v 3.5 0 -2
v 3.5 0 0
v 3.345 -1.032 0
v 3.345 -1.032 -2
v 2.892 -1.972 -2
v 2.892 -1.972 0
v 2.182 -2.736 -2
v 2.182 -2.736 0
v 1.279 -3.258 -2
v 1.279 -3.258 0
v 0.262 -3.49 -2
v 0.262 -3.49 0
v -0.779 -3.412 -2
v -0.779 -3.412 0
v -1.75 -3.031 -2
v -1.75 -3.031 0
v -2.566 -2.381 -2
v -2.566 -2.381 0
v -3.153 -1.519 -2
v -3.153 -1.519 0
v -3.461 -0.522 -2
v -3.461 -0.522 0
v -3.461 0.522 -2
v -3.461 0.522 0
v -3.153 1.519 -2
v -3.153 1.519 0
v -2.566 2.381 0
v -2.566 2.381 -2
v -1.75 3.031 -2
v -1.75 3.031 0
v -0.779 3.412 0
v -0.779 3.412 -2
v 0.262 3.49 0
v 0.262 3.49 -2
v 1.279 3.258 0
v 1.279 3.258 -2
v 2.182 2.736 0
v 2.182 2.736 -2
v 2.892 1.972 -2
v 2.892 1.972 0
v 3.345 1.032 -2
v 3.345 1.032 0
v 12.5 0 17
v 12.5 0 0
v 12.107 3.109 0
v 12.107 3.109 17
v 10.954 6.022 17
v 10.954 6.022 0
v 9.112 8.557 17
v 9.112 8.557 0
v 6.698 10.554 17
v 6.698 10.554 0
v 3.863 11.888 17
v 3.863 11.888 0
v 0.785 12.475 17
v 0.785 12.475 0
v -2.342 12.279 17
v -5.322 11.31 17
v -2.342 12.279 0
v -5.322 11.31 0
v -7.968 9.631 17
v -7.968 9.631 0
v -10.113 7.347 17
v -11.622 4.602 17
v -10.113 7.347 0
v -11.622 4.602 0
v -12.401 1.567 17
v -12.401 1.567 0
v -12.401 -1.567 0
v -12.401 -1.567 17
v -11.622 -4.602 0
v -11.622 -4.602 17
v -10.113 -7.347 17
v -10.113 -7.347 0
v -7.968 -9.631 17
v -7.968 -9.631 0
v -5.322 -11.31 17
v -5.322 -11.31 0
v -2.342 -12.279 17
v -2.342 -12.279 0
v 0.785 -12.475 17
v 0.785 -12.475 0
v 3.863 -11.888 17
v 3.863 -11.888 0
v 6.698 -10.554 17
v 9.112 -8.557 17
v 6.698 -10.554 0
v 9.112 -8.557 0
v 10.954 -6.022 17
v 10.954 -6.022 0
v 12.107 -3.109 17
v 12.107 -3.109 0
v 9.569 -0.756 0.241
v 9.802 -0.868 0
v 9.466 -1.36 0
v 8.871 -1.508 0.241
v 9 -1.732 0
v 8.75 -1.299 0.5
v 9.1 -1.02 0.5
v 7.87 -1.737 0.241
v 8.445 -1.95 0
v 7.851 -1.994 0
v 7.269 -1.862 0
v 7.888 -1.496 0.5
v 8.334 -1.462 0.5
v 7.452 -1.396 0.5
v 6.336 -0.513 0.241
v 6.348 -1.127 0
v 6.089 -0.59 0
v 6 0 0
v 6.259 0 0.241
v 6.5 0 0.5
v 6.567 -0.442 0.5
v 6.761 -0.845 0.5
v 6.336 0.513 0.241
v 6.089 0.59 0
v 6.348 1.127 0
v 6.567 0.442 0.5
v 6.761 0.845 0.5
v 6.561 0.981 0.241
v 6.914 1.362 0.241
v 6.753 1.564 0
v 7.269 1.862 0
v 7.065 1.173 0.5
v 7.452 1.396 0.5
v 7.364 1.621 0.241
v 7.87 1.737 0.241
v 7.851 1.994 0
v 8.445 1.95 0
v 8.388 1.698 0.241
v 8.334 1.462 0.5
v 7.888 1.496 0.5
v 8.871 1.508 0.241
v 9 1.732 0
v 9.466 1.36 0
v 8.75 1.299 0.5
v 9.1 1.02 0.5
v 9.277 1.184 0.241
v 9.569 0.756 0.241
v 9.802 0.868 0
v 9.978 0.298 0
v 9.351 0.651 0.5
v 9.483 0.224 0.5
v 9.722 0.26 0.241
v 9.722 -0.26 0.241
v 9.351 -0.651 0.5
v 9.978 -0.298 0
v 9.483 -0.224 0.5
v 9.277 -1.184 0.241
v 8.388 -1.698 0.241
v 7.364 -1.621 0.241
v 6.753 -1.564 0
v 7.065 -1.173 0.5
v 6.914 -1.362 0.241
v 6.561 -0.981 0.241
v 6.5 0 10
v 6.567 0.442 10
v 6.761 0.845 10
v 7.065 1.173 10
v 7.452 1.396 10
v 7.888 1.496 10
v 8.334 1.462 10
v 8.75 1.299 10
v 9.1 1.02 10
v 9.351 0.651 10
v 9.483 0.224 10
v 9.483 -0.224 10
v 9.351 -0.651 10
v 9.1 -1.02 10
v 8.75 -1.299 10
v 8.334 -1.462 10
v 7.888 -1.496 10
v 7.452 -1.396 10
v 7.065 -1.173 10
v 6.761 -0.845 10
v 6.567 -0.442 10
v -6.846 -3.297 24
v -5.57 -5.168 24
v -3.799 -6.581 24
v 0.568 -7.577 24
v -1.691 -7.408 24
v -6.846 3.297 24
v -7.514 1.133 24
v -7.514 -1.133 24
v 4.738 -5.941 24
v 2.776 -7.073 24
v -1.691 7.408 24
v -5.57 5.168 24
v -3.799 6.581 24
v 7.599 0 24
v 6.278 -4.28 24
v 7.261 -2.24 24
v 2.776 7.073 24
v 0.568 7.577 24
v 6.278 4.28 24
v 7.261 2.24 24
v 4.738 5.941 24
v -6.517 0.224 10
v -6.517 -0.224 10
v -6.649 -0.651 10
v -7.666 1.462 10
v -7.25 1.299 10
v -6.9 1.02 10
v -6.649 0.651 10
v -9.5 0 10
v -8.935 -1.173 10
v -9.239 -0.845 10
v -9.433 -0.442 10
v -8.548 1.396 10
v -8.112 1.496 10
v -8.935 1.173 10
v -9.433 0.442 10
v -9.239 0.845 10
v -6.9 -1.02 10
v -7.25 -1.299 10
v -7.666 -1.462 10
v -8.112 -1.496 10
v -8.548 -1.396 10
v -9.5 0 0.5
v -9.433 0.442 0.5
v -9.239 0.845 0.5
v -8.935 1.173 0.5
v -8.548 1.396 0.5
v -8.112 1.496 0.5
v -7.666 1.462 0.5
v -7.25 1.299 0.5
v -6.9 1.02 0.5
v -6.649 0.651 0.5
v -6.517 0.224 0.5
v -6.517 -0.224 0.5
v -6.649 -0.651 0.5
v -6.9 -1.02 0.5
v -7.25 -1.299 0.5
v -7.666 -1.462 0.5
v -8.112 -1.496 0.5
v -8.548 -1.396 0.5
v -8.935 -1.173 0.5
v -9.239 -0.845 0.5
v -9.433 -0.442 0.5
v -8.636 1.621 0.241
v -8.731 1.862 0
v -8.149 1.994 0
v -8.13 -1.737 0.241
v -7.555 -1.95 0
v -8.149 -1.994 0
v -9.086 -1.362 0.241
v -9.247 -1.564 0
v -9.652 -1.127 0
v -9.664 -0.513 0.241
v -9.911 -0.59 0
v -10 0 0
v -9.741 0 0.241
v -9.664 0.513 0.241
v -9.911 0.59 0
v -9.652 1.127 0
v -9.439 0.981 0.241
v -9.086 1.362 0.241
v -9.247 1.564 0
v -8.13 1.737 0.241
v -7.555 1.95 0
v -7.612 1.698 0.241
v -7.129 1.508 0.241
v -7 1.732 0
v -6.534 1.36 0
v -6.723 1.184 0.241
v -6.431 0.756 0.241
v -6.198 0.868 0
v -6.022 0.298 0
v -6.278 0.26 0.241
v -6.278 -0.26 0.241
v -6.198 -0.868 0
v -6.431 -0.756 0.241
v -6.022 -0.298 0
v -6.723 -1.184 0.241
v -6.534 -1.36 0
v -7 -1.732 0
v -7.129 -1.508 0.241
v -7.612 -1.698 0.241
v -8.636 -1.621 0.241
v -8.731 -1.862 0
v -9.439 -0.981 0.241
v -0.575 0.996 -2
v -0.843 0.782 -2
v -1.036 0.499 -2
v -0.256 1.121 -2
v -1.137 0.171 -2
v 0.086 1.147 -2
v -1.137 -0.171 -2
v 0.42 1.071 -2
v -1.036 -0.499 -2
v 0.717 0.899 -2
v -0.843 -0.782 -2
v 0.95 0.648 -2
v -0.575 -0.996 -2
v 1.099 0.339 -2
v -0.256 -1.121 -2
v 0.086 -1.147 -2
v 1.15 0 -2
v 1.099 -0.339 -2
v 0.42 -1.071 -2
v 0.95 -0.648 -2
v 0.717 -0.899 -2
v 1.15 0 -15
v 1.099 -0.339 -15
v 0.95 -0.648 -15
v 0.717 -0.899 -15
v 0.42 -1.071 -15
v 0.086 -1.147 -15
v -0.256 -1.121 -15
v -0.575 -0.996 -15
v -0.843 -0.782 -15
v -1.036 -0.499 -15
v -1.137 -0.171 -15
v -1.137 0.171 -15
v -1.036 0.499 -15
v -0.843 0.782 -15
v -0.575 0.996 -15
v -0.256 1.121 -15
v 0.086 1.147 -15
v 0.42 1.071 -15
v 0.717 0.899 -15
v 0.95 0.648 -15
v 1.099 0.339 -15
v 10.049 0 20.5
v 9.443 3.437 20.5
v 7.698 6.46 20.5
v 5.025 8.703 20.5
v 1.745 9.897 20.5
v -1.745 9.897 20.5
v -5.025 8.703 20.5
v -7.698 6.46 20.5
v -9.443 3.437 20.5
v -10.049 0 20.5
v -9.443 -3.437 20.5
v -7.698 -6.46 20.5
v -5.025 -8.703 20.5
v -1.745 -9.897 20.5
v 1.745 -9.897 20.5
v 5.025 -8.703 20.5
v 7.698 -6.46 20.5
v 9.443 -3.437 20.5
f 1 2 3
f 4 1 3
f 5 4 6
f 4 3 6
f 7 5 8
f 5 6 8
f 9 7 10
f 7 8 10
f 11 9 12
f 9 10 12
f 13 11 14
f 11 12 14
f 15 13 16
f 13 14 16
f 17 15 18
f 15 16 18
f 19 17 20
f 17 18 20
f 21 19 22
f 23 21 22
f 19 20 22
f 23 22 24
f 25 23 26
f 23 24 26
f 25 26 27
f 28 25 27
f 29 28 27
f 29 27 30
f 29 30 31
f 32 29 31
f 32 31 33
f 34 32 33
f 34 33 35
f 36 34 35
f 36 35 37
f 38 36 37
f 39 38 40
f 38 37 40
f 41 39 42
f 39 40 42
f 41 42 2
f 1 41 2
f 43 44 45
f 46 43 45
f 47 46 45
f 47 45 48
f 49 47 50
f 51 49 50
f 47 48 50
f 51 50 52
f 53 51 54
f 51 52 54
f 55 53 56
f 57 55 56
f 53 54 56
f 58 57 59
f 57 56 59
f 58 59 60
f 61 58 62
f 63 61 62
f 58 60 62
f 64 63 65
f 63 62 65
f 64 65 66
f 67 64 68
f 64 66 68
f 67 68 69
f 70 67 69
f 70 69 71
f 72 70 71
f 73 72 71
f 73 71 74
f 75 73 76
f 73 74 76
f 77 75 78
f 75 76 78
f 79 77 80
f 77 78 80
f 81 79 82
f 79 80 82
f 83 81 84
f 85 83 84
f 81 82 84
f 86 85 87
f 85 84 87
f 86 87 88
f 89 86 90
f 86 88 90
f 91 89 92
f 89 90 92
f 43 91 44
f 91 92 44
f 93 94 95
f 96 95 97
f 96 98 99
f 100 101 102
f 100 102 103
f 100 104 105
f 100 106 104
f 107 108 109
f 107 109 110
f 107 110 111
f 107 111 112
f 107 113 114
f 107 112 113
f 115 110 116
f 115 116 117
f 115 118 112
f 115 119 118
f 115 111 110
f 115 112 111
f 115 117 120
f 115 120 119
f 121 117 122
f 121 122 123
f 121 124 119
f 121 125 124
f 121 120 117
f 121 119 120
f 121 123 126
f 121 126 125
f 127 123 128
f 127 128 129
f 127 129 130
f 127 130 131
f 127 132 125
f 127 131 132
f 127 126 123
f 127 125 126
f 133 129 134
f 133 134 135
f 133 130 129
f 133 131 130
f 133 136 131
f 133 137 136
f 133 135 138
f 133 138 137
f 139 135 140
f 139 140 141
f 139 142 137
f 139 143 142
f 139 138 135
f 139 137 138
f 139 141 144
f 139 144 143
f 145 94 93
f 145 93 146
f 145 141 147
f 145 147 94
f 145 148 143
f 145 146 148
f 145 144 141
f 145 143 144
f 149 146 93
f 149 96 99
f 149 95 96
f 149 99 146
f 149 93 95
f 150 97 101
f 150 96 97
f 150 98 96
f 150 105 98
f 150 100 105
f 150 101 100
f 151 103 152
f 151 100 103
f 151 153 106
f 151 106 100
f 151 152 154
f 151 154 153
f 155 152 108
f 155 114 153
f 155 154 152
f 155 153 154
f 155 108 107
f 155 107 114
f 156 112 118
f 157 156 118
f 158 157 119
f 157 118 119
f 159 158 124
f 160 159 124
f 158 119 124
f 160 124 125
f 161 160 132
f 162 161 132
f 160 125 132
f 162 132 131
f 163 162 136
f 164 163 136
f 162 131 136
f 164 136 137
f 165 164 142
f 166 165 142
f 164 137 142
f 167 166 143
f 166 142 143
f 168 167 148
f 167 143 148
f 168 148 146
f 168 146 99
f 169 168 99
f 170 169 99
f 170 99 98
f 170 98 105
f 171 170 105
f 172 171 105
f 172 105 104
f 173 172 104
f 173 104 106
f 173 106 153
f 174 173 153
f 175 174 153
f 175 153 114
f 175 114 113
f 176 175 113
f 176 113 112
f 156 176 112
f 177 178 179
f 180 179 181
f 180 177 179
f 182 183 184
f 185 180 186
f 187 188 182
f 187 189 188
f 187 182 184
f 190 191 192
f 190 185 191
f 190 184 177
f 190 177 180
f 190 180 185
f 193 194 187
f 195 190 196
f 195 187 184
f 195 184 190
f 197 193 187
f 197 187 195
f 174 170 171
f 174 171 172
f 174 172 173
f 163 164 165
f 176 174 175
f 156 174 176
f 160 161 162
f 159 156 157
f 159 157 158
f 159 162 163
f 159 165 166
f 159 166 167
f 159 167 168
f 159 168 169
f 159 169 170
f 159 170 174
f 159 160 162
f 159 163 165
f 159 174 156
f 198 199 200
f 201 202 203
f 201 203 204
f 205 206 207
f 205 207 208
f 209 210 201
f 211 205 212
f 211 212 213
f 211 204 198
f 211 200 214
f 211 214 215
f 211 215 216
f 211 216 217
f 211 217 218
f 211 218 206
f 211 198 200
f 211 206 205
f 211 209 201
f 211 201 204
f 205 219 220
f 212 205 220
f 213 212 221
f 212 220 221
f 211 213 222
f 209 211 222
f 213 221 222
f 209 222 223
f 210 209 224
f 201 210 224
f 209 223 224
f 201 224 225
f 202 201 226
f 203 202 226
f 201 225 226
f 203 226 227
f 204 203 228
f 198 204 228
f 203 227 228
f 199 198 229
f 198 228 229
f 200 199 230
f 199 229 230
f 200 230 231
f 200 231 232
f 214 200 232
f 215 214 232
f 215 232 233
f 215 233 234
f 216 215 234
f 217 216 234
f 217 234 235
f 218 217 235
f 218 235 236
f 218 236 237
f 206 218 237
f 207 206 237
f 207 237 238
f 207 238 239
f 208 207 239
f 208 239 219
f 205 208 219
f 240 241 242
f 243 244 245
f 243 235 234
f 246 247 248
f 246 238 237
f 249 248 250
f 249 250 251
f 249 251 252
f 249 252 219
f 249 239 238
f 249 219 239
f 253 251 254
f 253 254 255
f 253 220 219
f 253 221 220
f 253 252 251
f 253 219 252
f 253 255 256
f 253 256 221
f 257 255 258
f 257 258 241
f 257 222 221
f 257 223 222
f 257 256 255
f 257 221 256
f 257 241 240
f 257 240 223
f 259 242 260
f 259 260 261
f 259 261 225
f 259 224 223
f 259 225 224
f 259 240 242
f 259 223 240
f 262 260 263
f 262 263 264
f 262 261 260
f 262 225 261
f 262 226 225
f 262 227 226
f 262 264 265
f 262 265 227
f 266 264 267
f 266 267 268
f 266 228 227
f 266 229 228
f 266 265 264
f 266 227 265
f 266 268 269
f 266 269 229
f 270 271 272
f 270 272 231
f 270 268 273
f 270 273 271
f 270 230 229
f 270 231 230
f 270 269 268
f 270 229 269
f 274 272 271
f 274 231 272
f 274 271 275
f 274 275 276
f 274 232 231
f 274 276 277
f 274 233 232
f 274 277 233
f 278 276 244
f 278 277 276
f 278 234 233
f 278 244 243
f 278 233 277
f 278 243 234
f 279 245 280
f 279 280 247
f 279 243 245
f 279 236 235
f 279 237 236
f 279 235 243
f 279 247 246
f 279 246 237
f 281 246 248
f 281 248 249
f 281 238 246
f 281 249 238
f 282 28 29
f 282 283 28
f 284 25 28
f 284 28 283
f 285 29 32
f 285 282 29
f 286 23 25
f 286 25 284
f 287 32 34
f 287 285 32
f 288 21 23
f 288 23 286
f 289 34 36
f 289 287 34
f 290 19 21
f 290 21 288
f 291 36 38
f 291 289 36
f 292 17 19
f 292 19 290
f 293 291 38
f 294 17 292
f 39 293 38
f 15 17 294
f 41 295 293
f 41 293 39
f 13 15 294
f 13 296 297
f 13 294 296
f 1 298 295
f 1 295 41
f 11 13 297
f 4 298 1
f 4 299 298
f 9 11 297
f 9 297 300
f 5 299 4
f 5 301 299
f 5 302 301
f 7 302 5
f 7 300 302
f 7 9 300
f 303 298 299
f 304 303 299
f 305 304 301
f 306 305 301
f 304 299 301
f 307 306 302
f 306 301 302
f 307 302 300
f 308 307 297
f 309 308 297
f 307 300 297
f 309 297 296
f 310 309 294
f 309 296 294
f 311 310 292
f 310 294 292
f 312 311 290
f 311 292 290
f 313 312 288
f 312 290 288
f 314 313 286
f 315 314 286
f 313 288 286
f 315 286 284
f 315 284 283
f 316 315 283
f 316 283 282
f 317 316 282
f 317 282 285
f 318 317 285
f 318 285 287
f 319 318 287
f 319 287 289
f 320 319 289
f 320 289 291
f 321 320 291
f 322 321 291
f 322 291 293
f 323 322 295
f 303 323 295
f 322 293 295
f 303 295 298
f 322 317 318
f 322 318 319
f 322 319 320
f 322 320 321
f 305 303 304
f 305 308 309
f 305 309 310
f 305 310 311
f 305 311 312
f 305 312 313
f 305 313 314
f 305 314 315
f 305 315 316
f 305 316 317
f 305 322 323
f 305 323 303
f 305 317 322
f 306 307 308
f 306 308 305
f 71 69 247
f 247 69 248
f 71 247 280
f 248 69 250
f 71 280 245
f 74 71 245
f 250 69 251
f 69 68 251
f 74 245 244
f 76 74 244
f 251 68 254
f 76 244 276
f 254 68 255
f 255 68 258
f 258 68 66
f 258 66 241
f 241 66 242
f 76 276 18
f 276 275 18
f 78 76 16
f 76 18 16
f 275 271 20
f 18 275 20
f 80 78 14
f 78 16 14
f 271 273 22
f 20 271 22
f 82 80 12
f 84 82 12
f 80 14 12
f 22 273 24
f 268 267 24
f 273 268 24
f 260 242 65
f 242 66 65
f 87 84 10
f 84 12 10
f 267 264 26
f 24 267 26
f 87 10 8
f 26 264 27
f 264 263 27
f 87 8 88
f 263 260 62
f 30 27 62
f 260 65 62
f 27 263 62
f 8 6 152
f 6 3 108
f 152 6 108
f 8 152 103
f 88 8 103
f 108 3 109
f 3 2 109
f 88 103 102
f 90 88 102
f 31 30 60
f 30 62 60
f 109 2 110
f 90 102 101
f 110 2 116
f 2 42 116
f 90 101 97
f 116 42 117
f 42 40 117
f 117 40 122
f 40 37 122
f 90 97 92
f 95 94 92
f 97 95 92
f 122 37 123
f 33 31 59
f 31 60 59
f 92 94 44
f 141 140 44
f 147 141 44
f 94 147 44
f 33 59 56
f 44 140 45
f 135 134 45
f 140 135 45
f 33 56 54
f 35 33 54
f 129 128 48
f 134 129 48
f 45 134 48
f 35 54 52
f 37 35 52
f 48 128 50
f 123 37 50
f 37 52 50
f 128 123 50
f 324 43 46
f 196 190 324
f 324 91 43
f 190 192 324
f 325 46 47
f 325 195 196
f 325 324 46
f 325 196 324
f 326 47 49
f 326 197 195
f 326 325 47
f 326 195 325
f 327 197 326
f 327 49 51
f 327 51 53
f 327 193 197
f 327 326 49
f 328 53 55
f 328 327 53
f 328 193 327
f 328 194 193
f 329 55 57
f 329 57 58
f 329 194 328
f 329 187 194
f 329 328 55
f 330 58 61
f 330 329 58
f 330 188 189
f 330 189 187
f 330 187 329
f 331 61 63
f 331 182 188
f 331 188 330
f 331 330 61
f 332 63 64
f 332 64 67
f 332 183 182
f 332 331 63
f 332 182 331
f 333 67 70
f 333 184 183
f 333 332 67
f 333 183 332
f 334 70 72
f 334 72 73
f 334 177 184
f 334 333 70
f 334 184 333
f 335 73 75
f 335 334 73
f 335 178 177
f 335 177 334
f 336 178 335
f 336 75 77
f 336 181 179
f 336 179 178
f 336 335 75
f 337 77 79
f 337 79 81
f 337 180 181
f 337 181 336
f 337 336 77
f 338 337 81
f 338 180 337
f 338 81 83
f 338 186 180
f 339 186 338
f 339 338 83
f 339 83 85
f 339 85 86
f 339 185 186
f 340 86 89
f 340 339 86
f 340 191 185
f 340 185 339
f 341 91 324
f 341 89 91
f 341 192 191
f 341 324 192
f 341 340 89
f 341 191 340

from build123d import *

# Parameters (mm, degrees)
ESQUISSE1_R             = 12.5
BOSS_EXTRU_1_DEPTH      = 17
ESQUISSE2_R             = 12.5
BOSS_EXTRU_2_DEPTH      = 7
BOSS_EXTRU_2_TAPER      = 35
ESQUISSE3_R             = 1.5
ENL_V_MAT_EXTRU_1_DEPTH = 10
CONG_1_SIZE             = 0.5
ESQUISSE4_R             = 3.5
BOSS_EXTRU_3_DEPTH      = 2
ESQUISSE5_R             = 1.15
BOSS_EXTRU_4_DEPTH      = 13


with BuildPart() as part:
    # Esquisse1 → Boss.-Extru.1 (new body)
    with BuildSketch(Plane.XY):
        Circle(ESQUISSE1_R)
    extrude(amount=BOSS_EXTRU_1_DEPTH)

    # Esquisse2 → Boss.-Extru.2 (add)
    with BuildSketch(Plane.XY.offset(17)):
        Circle(ESQUISSE2_R)
    extrude(amount=BOSS_EXTRU_2_DEPTH, taper=BOSS_EXTRU_2_TAPER)

    # Esquisse3 → Enlèv. mat.-Extru.1 (cut)
    with BuildSketch(Plane(origin=(0, 0, 0), x_dir=(-1, 0, 0), z_dir=(0, 0, -1))):
        with Locations((-8, 0)):
            Circle(ESQUISSE3_R)
        with Locations((8, 0)):
            Circle(ESQUISSE3_R)
    extrude(amount=-ENL_V_MAT_EXTRU_1_DEPTH, mode=Mode.SUBTRACT)

    # Congé1
    # a fillet whose section is not a circle: 0.5 mm, written as the material it takes off along each edge
    with BuildSketch(Plane(origin=(-8, 0, 0), x_dir=(-1, 0, 0), z_dir=(0, -1, 0))) as cong_1_piece_1:
        with BuildLine():
            Bezier((1.5 + CONG_1_SIZE, 0), (1.5, 0), (1.5, -CONG_1_SIZE), weights=[1, 0.035355339, 1])
            Line((1.5, -CONG_1_SIZE), (1.5, 0))
            Line((1.5, 0), (1.5 + CONG_1_SIZE, 0))
        make_face()
    revolve(axis=Axis((-8, 0, 0), (0, 0, -1)), mode=Mode.SUBTRACT)
    with BuildSketch(Plane(origin=(8, 0, 0), x_dir=(-1, 0, 0), z_dir=(0, -1, 0))) as cong_1_piece_2:
        with BuildLine():
            Bezier((1.5 + CONG_1_SIZE, 0), (1.5, 0), (1.5, -CONG_1_SIZE), weights=[1, 0.035355339, 1])
            Line((1.5, -CONG_1_SIZE), (1.5, 0))
            Line((1.5, 0), (1.5 + CONG_1_SIZE, 0))
        make_face()
    revolve(axis=Axis((8, 0, 0), (0, 0, -1)), mode=Mode.SUBTRACT)

    # Esquisse4 → Boss.-Extru.3 (add)
    with BuildSketch(Plane(origin=(0, 0, 0), x_dir=(-1, 0, 0), z_dir=(0, 0, -1))):
        with Locations(Location((0, 0, 0), (0, 0, 180))):
            Circle(ESQUISSE4_R)
    extrude(amount=BOSS_EXTRU_3_DEPTH)

    # Esquisse5 → Boss.-Extru.4 (add)
    with BuildSketch(Plane(origin=(0, 0, -2), x_dir=(-1, 0, 0), z_dir=(0, 0, -1))):
        with Locations(Location((0, 0, 0), (0, 0, 180))):
            Circle(ESQUISSE5_R)
    extrude(amount=BOSS_EXTRU_4_DEPTH)


solid = part.part
